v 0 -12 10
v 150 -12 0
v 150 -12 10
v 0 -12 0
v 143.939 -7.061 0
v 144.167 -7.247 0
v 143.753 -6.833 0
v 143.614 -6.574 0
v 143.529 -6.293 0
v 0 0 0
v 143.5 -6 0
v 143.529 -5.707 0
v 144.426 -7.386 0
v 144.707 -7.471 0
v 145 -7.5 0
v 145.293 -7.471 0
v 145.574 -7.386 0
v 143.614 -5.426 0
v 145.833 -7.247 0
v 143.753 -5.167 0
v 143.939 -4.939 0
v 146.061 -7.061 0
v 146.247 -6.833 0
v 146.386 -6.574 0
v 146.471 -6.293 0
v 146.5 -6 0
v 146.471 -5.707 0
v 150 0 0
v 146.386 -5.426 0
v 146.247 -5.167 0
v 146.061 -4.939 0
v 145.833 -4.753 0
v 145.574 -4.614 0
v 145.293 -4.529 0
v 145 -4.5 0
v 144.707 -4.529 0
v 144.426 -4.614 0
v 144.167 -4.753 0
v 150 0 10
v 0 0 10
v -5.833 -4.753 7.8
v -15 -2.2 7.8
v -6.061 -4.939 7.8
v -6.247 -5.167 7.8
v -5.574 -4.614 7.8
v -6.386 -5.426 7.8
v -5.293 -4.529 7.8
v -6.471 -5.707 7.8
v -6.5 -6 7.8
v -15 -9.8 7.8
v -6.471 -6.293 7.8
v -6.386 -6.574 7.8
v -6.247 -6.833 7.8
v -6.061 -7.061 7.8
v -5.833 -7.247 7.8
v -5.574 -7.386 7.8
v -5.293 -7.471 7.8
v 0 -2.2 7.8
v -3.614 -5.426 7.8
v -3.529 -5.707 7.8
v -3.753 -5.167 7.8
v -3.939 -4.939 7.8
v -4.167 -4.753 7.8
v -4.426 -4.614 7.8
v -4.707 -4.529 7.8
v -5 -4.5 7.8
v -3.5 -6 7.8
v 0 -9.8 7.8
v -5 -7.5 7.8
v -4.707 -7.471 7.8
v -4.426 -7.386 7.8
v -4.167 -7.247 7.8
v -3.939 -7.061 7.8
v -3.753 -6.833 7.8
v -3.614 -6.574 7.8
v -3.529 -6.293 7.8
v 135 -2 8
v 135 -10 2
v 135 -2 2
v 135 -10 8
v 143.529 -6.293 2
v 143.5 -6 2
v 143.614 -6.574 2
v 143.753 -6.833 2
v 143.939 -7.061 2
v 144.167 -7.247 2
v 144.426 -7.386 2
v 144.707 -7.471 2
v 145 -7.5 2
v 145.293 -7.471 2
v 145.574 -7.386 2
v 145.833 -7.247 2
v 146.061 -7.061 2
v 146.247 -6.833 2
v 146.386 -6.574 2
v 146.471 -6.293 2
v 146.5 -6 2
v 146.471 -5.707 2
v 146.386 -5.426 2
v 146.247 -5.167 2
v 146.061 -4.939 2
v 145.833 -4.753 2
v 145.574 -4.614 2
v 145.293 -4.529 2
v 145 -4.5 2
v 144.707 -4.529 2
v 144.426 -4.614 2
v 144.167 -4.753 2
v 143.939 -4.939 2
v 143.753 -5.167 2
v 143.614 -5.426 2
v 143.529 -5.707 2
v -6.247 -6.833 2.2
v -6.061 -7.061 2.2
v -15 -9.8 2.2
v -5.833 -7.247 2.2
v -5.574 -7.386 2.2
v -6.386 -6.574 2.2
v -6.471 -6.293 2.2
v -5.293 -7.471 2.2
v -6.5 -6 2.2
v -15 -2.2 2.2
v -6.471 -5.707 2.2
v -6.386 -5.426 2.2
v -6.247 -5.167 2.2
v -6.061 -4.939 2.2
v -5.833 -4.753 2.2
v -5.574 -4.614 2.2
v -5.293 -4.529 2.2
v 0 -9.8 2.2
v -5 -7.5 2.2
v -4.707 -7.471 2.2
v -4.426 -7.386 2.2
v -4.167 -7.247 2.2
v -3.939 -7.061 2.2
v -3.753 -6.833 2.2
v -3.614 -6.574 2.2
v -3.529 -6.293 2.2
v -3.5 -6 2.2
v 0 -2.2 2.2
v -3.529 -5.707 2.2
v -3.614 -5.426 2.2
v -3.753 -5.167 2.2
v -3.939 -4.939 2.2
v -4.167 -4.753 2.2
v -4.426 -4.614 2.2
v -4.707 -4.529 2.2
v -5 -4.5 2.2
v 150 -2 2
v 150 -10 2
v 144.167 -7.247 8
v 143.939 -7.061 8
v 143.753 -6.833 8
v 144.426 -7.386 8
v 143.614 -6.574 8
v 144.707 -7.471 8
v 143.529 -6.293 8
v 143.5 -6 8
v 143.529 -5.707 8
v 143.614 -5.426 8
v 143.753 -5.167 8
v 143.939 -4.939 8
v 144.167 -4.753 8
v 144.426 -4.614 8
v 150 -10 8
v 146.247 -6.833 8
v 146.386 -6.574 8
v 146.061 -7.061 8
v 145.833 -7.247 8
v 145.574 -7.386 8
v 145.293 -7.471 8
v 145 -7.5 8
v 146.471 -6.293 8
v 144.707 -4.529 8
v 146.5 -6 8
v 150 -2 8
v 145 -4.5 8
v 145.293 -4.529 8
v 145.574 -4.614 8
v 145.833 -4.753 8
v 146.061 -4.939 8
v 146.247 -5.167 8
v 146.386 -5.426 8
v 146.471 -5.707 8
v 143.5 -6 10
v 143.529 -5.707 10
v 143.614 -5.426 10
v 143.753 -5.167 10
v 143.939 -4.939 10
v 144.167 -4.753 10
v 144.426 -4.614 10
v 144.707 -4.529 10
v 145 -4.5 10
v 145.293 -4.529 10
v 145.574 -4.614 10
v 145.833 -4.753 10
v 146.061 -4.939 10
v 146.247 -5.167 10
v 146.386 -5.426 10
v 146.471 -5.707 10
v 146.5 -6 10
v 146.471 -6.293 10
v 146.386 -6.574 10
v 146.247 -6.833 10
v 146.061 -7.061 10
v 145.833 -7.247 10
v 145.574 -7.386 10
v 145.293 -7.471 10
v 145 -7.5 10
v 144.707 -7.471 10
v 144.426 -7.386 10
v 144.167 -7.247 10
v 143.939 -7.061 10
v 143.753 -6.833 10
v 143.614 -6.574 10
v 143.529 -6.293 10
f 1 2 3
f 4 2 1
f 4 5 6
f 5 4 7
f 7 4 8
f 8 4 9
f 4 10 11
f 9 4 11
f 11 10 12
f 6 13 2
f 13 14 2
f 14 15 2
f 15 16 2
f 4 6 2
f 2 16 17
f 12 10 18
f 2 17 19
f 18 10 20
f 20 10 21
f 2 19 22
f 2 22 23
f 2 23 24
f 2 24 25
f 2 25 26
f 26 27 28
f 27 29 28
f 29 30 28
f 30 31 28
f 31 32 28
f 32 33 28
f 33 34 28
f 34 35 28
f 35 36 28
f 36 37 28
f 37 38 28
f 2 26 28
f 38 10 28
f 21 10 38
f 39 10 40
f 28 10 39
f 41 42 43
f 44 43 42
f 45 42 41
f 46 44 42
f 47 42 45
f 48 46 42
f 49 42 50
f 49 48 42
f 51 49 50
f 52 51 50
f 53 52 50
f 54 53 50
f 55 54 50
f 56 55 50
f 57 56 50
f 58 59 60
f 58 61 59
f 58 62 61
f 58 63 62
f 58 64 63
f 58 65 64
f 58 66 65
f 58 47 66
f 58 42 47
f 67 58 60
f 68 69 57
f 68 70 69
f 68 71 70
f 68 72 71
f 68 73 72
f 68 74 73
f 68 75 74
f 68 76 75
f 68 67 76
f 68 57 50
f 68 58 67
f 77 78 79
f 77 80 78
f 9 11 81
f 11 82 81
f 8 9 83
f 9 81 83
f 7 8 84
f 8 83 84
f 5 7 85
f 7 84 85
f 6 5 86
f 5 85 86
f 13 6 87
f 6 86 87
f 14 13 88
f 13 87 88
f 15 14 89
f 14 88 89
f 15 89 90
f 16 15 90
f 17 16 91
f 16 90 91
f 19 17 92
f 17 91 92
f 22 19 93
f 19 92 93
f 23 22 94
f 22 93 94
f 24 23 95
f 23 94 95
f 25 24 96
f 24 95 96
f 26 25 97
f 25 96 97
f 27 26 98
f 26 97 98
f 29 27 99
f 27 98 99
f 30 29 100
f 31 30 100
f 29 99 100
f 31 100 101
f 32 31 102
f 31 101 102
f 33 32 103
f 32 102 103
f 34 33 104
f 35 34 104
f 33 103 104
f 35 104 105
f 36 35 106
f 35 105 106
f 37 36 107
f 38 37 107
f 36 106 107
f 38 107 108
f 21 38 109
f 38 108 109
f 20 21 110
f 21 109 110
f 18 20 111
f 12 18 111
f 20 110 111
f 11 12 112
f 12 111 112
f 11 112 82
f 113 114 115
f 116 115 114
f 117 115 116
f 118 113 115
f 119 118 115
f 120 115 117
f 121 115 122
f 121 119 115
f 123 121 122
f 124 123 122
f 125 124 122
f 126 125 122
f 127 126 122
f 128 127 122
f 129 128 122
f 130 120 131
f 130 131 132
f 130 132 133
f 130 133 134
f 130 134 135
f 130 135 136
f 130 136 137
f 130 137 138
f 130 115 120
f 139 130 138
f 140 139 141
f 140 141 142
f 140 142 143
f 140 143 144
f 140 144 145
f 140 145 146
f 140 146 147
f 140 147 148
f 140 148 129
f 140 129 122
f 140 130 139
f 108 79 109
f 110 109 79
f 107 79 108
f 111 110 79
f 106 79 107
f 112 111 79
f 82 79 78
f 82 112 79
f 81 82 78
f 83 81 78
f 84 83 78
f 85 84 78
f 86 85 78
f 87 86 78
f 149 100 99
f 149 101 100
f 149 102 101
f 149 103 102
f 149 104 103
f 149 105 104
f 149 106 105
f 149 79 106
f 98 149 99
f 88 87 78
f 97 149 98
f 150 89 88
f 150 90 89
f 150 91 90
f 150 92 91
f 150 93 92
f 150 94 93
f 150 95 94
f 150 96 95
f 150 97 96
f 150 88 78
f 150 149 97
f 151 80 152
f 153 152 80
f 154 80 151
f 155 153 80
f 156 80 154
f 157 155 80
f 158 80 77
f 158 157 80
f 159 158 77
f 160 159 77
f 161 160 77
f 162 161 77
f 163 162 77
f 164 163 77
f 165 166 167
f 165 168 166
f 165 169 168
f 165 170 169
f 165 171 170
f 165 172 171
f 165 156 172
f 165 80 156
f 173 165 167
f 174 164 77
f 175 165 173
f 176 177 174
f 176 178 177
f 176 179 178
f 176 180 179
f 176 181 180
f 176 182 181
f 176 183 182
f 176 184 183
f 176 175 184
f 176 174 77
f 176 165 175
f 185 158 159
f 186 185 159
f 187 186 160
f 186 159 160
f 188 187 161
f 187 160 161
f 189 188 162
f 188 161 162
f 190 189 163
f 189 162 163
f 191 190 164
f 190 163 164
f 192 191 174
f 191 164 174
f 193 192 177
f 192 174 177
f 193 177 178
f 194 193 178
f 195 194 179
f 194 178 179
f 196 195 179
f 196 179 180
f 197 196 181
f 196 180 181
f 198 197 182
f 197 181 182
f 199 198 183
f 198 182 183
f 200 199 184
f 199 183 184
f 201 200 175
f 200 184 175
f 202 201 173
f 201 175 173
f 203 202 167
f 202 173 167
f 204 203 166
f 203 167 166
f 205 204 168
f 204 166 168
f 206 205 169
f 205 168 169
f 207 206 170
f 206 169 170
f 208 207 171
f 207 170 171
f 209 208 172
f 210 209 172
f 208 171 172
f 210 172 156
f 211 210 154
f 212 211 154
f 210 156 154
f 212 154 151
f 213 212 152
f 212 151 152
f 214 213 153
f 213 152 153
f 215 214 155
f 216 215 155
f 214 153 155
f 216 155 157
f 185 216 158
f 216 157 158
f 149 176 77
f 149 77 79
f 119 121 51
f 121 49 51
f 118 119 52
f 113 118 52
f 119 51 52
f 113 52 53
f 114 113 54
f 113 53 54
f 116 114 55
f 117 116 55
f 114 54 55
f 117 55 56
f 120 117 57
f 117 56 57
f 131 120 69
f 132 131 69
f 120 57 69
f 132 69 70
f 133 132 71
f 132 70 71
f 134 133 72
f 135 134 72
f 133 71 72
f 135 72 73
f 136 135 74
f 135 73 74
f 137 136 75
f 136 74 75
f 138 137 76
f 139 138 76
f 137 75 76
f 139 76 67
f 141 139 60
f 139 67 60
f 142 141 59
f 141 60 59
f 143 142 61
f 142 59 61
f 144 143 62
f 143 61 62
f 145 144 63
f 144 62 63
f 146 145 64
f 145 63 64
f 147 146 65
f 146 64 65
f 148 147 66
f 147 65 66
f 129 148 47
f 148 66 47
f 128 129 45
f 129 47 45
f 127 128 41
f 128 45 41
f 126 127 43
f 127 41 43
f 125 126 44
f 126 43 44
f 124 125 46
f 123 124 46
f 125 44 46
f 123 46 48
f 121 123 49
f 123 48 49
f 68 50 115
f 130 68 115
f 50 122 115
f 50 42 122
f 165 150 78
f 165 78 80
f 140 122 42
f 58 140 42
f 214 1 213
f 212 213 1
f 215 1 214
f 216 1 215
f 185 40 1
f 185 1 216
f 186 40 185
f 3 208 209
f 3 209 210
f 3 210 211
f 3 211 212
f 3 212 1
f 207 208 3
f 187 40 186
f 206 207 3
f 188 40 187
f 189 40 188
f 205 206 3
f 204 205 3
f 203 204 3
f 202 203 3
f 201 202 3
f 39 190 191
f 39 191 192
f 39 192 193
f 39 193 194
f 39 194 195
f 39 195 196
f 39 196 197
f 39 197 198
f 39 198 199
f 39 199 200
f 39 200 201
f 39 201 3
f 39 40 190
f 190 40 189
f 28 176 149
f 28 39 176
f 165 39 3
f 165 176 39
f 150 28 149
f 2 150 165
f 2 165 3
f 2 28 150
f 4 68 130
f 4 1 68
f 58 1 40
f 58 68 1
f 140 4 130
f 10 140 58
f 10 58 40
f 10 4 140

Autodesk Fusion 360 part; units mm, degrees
sketch "Sketch1" plane through (0, 0, 0) normal (0, 0, 1) x (1, 0, 0)
  line L0 (0, 0) -> (150, 0)
  line L1 (150, 0) -> (150, -12)
  line L2 (150, -12) -> (0, -12)
  line L3 (0, -12) -> (0, 0)
  dimension "d16" = 150
  dimension "d17" = 12
extrude "Extrude1" add sketch "Sketch1" along normal blind 10
sketch "Sketch3" plane through (0, 0, 0) normal (-1, 0, 0) x (0, -1, 0)
  line L0 (0, 0) -> (12, 0)
  line L1 (12, 0) -> (12, 10)
  line L2 (12, 10) -> (0, 10)
  line L3 (0, 10) -> (0, 0)
  line L4 (2.2, 7.8) -> (9.8, 7.8)
  line L5 (9.8, 7.8) -> (9.8, 2.2)
  line L6 (9.8, 2.2) -> (2.2, 2.2)
  line L7 (2.2, 2.2) -> (2.2, 7.8)
  dimension "d22" = 7.6
  dimension "d23" = 5.6
  dimension "d26" = 2.2
  dimension "d27" = 2.2
extrude "Extrude2" add sketch "Sketch3" along normal blind 15 contours L4 L5 L6 L7
sketch "Sketch4" plane through (150, 0, 0) normal (1, 0, 0) x (0, 1, 0)
  line L0 (-12, 0) -> (0, 0)
  line L1 (0, 0) -> (0, 10)
  line L2 (0, 10) -> (-12, 10)
  line L3 (-12, 10) -> (-12, 0)
  line L4 (-10, 8) -> (-2, 8)
  line L5 (-2, 8) -> (-2, 2)
  line L6 (-2, 2) -> (-10, 2)
  line L7 (-10, 2) -> (-10, 8)
  dimension "d30" = 6
  dimension "d31" = 8
  dimension "d34" = 2
  dimension "d35" = 2
extrude "Extrude3" cut sketch "Sketch4" against normal blind 15 contours L4 L5 L6 L7
sketch "Sketch5" plane through (0, 0, 7.8) normal (0, 0, 1) x (-1, 0, 0)
  line L0 (0, 2.2) -> (15, 2.2)
  line L1 (15, 2.2) -> (15, 9.8)
  line L2 (15, 9.8) -> (0, 9.8)
  circle A0 centre (5, 6) radius 1.5
  circle A1 centre (-145, 6) radius 1.5
  line L3 (-150, 12) -> (-150, 0)
  line L4 (-150, 0) -> (0, 0)
  line L5 (0, 9.8) -> (0, 2.2)
  dimension "d37" = 3
  dimension "d38" = 3
  dimension "d43" = 10
  dimension "d44" = 3.8
  dimension "d45" = 5
  dimension "d46" = 6
extrude "Extrude4" cut sketch "Sketch5" against normal blind 100 contours A0
extrude "Extrude5" cut sketch "Sketch5" along normal mid plane 200 contours A1
equation "main_length = 150 mm"
equation "height = 10 mm"
equation "dowel_edge_width = 7.6 mm"
equation "dowel_edge_length = 15 mm"
equation "length = 180 mm"
equation "edge_hole_radius = 1.5 mm"
equation "dowel_edge_hole_big_distance = 10 mm"
equation "dowel_edge_hole_small_distance = dowel_edge_width / 2"
equation "hollow_edge_length = 15 mm"
equation "hollow_edge_width = 8 mm"
equation "width = 12 mm"
equation "dowel_edge_height = 5.6 mm"
equation "hollow_edge_height = 6 mm"
equation "hollow_edge_hole_big_distance = 5 mm"
equation "hollow_edge_hole_small_distance = width / 2"
equation "d16 = main_length"
equation "d17 = width"
equation "d18 = height"
equation "dowel_edge_small_distance = ( width - dowel_edge_width ) / 2"
equation "dowel_edge_big_distance = ( height - dowel_edge_height ) / 2"
equation "d22 = dowel_edge_width"
equation "d23 = dowel_edge_height"
equation "d24 = dowel_edge_length"
equation "d26 = dowel_edge_big_distance"
equation "d27 = dowel_edge_small_distance"
equation "hollow_edge_small_distance = ( width - hollow_edge_width ) / 2"
equation "hollow_edge_big_distance = ( height - hollow_edge_height ) / 2"
equation "d30 = hollow_edge_height"
equation "d31 = hollow_edge_width"
equation "d32 = -hollow_edge_length"
equation "d34 = hollow_edge_big_distance"
equation "d35 = hollow_edge_small_distance"
equation "extra = 100 mm"
equation "d37 = edge_hole_radius * 2"
equation "d38 = edge_hole_radius * 2"
equation "d39 = -extra"
equation "d41 = extra"
equation "d43 = dowel_edge_hole_big_distance"
equation "d44 = dowel_edge_hole_small_distance"
equation "d45 = hollow_edge_hole_big_distance"
equation "d46 = hollow_edge_hole_small_distance"
